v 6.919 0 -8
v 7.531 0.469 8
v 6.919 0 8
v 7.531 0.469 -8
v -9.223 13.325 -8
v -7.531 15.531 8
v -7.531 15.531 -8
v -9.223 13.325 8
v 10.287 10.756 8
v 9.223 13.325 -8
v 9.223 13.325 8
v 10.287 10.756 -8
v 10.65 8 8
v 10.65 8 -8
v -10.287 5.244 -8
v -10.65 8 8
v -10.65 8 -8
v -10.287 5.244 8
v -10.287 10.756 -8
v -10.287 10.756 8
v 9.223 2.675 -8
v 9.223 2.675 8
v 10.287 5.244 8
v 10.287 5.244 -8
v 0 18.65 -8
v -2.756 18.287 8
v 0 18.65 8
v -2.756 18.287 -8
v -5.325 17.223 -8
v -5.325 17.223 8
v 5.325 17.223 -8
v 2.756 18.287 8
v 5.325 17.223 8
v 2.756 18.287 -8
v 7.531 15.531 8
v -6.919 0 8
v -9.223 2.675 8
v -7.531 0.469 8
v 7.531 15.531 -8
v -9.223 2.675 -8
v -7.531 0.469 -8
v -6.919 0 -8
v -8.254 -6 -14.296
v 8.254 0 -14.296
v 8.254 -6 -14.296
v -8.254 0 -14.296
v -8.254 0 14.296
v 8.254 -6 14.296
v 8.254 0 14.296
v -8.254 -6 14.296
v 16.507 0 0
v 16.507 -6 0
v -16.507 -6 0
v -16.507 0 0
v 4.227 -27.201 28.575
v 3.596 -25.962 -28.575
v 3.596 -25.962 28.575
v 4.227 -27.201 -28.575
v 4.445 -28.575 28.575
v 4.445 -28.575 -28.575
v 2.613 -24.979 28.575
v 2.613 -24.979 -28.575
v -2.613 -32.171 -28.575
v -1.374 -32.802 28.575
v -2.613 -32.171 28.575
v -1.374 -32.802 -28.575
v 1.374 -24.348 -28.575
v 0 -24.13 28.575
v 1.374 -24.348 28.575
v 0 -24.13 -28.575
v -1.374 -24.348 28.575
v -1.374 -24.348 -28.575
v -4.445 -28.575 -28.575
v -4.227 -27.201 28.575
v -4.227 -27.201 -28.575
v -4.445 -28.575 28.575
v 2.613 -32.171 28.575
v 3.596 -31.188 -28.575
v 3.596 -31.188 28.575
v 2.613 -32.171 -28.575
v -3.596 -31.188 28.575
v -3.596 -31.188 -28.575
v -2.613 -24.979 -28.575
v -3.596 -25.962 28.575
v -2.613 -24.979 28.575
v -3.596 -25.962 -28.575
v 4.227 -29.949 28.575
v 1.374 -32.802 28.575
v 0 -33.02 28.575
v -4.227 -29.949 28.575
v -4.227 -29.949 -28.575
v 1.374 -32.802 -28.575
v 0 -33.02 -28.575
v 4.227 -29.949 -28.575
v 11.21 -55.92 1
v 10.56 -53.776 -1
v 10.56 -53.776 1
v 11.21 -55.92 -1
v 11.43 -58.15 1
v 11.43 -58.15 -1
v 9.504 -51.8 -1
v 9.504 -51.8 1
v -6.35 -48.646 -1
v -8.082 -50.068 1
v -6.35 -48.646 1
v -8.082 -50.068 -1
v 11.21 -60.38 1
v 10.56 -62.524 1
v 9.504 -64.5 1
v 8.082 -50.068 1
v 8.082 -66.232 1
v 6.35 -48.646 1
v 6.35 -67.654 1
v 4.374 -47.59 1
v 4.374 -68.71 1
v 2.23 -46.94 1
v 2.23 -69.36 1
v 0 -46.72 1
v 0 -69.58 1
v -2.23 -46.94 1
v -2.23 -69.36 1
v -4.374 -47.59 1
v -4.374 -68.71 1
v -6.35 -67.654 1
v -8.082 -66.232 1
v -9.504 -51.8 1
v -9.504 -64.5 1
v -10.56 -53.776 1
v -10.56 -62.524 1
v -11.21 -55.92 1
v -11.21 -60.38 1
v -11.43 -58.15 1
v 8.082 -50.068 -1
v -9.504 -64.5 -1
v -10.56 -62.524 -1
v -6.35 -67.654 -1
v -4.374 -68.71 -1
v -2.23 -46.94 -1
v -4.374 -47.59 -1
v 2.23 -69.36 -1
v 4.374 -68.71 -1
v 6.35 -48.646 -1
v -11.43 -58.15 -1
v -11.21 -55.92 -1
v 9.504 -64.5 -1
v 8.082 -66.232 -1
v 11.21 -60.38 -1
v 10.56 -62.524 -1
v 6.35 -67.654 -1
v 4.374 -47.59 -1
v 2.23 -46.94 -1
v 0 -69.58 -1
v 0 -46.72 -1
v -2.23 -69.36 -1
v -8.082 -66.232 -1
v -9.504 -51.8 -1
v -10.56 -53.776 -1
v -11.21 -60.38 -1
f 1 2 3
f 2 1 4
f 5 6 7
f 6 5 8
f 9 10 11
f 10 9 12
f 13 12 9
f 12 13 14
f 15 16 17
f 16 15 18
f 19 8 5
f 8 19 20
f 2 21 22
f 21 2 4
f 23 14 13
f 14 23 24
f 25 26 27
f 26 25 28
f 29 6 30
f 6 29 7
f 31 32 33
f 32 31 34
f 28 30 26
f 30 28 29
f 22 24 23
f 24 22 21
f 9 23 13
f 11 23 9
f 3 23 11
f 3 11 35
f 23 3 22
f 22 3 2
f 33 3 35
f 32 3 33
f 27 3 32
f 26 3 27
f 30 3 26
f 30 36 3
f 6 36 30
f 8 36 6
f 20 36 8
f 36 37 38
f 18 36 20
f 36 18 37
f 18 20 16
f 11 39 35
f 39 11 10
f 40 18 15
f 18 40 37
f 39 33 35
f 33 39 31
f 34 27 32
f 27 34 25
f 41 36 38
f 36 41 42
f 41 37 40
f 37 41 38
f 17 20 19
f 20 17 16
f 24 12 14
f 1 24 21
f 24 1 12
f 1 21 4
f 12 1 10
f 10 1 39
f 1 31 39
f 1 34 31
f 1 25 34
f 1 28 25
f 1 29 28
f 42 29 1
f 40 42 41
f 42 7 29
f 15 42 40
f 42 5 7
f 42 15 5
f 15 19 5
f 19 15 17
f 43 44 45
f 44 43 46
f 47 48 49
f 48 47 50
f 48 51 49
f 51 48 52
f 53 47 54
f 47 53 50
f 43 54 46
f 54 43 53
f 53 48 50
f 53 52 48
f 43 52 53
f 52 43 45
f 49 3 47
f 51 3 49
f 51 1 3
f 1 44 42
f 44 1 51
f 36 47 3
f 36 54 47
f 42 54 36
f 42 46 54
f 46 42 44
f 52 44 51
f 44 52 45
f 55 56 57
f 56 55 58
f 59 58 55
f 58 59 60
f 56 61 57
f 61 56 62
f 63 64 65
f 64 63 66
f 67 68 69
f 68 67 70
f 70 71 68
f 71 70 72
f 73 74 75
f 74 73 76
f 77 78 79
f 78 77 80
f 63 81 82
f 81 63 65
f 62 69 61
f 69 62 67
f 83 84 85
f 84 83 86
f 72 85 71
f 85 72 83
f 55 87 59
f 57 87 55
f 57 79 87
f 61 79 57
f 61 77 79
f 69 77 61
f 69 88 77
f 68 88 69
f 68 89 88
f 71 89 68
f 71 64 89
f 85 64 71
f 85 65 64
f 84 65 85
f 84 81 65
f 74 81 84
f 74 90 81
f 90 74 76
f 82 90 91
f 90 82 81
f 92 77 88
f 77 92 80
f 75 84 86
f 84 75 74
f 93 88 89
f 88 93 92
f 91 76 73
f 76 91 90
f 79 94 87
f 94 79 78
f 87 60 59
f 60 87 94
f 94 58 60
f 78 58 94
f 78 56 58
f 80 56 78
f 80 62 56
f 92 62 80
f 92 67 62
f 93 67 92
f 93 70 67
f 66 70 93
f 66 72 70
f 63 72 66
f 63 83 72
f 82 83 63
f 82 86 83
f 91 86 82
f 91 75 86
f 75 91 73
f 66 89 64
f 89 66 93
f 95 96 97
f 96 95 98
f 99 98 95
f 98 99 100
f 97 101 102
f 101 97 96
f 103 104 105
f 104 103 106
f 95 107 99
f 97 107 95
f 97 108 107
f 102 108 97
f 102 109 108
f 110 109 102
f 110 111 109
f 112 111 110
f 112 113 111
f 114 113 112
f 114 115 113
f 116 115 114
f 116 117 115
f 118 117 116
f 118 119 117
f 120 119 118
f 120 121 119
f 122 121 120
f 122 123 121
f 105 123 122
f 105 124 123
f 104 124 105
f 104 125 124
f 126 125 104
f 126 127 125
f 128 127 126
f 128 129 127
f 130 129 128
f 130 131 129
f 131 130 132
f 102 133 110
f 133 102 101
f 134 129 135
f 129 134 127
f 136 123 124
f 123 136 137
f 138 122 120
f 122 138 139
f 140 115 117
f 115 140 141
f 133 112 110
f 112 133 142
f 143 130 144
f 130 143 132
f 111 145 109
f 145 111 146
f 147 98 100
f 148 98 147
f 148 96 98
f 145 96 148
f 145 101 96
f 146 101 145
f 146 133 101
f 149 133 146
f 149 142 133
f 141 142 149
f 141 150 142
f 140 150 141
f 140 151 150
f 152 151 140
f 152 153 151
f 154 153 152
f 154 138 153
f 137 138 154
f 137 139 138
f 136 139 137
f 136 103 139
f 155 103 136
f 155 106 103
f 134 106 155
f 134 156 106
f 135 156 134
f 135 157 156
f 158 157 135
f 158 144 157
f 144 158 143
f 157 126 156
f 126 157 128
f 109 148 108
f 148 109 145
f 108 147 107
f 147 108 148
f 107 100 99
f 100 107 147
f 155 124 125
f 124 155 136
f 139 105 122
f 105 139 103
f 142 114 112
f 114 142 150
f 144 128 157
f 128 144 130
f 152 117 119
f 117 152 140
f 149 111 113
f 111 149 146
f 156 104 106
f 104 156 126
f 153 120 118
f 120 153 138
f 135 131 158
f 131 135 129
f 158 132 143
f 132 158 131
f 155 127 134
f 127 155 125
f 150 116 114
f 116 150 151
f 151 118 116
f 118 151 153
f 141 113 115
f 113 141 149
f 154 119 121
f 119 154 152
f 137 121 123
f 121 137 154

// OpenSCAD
// Auto-generated by scripts/author_from_manifest.py (Phase D.3).
// Source: data/phase_d_manifest.json (sku_intent='tyco-ty4251-pendent-k80-175f').
// Do not hand-edit — regenerate from the manifest.
//
// @part tyco_ty4251_pendent_k80_175f
// @kind sprinkler_head
// @category head.pendant.k80
// @display-name "Tyco TY4251 Pendent K8.0 SR 175°F"
// @mfg tyco_fire_protection
// @mfg-pn TY4251
// @listing UL FM
// @hazard-classes OH1 OH2
// @price-usd 16.90
// @install-minutes 8
// @crew journeyman
// @k-factor 8
// @orientation pendant
// @response standard
// @temperature 175F
// @param size_in number default=0.5 label="Size" unit="in"
// @port inlet position=[0,0.014,0] direction=[0,1,0] style=NPT_threaded size_in=0.5 role=drop

size_in = 0.5;
k_factor = 8.0;

length_mm   = 57.15;
body_dia_mm = 25.40;
thread_od   = 21.3;
thread_len  = 16;
deflector_d = body_dia_mm * 0.9;

 union() {
    translate([0, thread_len/2, 0])
        cylinder(h = thread_len, d = thread_od, center = true, $fn = 24);
    translate([0, -3, 0])
        rotate([90, 0, 0])
        cylinder(h = 6, d = thread_od * 1.55, $fn = 6, center = true);
    translate([0, -length_mm/2, 0])
        cylinder(h = length_mm, d = body_dia_mm * 0.35, center = true, $fn = 20);
    translate([0, -length_mm - 1, 0])
        cylinder(h = 2, d = deflector_d, center = true, $fn = 32);
}
